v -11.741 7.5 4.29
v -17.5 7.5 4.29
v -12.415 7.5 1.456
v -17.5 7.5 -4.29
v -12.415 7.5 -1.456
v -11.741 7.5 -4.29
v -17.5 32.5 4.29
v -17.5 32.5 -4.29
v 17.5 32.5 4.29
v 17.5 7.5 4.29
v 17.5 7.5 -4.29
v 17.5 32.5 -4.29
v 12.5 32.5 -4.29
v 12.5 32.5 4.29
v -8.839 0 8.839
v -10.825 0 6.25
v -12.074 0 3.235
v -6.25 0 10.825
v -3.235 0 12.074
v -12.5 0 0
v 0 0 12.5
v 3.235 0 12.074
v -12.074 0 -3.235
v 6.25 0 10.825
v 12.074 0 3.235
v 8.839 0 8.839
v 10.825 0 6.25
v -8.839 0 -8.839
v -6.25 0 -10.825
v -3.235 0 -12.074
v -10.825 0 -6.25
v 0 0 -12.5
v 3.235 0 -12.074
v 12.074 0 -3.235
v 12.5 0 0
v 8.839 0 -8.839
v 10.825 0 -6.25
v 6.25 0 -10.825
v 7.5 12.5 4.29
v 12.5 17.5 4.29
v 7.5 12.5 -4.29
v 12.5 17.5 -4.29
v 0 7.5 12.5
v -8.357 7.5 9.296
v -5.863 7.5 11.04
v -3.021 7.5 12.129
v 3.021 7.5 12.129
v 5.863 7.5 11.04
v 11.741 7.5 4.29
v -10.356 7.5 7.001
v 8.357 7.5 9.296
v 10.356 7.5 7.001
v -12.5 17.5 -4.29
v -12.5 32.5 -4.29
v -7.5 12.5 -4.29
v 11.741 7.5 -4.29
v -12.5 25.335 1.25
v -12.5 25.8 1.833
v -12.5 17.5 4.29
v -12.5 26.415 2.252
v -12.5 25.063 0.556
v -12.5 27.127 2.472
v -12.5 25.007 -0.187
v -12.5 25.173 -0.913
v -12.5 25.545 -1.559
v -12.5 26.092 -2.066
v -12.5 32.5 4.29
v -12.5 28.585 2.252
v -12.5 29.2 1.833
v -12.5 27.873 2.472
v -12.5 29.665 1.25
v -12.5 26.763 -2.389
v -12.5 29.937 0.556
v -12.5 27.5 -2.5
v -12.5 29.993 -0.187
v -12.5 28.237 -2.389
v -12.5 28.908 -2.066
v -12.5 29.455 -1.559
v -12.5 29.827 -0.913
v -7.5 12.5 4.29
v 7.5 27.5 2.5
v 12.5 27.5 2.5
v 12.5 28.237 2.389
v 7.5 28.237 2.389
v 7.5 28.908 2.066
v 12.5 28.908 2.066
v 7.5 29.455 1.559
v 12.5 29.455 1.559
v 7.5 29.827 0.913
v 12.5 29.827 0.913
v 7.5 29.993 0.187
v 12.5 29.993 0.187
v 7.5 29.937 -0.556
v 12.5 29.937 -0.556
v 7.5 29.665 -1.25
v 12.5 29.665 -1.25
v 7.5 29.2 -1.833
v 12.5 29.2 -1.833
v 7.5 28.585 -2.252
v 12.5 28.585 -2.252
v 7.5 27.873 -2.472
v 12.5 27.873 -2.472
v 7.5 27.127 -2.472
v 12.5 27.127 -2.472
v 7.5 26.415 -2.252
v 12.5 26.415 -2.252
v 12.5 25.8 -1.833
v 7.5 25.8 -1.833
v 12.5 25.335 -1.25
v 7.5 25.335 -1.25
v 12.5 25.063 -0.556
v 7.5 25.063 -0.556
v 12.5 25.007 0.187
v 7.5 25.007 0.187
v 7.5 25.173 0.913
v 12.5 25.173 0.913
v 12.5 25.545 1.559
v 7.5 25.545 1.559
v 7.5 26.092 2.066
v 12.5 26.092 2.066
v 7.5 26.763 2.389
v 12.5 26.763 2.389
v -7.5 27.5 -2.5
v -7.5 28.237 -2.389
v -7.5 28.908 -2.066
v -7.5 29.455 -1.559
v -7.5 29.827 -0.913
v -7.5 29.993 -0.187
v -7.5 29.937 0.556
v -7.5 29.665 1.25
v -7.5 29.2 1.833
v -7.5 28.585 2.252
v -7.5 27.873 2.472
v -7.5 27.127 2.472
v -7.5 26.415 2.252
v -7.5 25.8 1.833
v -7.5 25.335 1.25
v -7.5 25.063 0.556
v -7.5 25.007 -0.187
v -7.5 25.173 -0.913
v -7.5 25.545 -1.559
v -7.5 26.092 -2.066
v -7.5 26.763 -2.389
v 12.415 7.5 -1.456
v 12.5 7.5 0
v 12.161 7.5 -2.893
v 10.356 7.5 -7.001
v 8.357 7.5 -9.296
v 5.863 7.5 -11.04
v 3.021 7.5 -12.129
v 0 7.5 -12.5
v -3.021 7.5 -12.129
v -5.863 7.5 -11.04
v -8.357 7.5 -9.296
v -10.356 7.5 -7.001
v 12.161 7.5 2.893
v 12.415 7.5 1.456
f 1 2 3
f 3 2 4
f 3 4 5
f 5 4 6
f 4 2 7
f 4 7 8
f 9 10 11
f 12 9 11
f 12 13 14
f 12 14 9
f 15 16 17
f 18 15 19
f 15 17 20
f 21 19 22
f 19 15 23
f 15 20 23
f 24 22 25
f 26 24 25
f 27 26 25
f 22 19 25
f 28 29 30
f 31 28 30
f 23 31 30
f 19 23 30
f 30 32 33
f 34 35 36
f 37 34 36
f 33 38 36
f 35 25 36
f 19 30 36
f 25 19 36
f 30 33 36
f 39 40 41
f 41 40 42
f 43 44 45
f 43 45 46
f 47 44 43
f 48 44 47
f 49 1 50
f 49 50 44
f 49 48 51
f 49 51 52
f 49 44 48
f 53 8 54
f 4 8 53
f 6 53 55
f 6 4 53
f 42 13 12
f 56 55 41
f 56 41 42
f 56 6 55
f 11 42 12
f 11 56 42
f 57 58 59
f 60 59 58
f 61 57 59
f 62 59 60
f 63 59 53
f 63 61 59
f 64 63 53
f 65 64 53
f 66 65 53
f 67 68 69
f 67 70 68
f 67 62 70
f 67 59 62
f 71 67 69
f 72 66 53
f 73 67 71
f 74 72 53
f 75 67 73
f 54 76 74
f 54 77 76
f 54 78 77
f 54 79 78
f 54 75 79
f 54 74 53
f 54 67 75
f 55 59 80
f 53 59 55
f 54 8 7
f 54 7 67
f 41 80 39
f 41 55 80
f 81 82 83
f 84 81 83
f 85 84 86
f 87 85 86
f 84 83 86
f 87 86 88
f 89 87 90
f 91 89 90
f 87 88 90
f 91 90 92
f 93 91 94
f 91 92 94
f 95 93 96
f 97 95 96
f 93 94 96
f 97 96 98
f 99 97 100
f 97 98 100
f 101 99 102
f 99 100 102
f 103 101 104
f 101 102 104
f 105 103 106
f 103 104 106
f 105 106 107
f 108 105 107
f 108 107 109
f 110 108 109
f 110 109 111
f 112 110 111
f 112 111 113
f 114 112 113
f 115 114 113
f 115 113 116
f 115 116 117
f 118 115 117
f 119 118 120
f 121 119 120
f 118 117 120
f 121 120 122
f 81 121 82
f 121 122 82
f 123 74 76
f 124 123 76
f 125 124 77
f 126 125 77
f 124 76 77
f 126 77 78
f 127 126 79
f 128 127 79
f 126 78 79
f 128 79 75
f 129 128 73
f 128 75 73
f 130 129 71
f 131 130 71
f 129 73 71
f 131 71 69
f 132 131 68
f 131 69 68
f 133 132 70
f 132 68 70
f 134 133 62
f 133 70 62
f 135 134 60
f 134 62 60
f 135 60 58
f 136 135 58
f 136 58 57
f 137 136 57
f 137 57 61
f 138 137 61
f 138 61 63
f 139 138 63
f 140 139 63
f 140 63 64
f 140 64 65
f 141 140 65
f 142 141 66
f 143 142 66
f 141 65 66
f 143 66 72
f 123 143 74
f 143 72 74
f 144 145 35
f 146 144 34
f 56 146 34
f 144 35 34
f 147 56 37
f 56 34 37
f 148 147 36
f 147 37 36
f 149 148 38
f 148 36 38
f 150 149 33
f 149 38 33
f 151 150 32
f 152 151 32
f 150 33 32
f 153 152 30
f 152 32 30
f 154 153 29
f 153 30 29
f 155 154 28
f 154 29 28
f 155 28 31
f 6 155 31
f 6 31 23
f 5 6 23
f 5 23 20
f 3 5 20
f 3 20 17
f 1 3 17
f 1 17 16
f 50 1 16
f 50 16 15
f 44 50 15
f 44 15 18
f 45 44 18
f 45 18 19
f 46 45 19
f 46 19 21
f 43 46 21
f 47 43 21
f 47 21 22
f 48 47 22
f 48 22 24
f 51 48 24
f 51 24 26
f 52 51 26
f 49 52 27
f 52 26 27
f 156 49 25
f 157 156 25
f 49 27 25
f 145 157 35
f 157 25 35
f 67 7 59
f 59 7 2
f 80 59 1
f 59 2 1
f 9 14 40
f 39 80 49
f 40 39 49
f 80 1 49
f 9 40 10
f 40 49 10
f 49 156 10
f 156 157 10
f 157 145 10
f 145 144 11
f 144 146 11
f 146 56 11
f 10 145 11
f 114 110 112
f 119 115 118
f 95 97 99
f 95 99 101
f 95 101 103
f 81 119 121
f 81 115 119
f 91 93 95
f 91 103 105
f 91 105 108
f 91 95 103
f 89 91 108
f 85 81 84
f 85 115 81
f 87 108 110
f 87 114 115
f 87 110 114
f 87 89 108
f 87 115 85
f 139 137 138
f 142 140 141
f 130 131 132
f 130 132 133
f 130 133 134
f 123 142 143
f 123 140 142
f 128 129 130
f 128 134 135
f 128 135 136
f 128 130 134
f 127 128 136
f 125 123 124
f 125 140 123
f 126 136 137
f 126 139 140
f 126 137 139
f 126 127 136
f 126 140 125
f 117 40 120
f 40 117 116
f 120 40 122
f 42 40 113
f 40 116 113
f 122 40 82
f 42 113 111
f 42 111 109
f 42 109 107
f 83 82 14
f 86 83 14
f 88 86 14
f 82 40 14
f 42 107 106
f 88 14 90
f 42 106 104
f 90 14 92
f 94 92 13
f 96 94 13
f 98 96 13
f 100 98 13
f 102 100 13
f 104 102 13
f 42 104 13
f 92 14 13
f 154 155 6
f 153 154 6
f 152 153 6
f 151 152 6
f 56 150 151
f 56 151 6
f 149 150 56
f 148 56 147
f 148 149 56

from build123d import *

# Parameters (mm, degrees)
SKETCH1_R           = 12.5
BOSS_EXTRUDE1_DEPTH = 7.5
SKETCH2_W           = 35
SKETCH2_H           = 8.580767914
BOSS_EXTRUDE2_DEPTH = 25
SKETCH3_W           = 25
SKETCH3_H           = 8.580767914
CUT_EXTRUDE1_DEPTH  = 20
SKETCH4_R           = 2.5
BOSS_EXTRUDE3_DEPTH = 5
SKETCH5_R           = 2.5
BOSS_EXTRUDE4_DEPTH = 5
CHAMFER1_SIZE       = 5
CHAMFER2_SIZE       = 5


with BuildPart() as part:
    # Sketch1 → Boss-Extrude1 (new body)
    with BuildSketch(Plane(origin=(0, 0, 0), x_dir=(1, 0, 0), z_dir=(0, 1, 0))):
        Circle(SKETCH1_R)
    extrude(amount=BOSS_EXTRUDE1_DEPTH)

    # Sketch2 → Boss-Extrude2 (add)
    with BuildSketch(Plane(origin=(0, 7.5, 0), x_dir=(1, 0, 0), z_dir=(0, 1, 0))):
        Rectangle(SKETCH2_W, SKETCH2_H)
    extrude(amount=BOSS_EXTRUDE2_DEPTH)

    # Sketch3 → Cut-Extrude1 (cut)
    with BuildSketch(Plane(origin=(0, 32.5, 0), x_dir=(1, 0, 0), z_dir=(0, 1, 0))):
        Rectangle(SKETCH3_W, SKETCH3_H)
    extrude(amount=-CUT_EXTRUDE1_DEPTH, mode=Mode.SUBTRACT)

    # Sketch4 → Boss-Extrude3 (add)
    with BuildSketch(Plane(origin=(-12.5, 0, 0), x_dir=(0, 0, -1), z_dir=(1, 0, 0))):
        with Locations((0, 27.5)):
            Circle(SKETCH4_R)
    extrude(amount=BOSS_EXTRUDE3_DEPTH)

    # Sketch5 → Boss-Extrude4 (add)
    with BuildSketch(Plane.ZY.offset(-12.5)):
        with Locations((0, 27.5)):
            Circle(SKETCH5_R)
    extrude(amount=BOSS_EXTRUDE4_DEPTH)

    # Chamfer1
    chamfer1_edges = [part.edges().sort_by_distance(p)[0] for p in [
        (-12.5, 12.5, 0),
    ]]
    chamfer(chamfer1_edges, length=CHAMFER1_SIZE)

    # Chamfer2
    chamfer2_edges = [part.edges().sort_by_distance(p)[0] for p in [
        (12.5, 12.5, 0),
    ]]
    chamfer(chamfer2_edges, length=CHAMFER2_SIZE)


solid = part.part
